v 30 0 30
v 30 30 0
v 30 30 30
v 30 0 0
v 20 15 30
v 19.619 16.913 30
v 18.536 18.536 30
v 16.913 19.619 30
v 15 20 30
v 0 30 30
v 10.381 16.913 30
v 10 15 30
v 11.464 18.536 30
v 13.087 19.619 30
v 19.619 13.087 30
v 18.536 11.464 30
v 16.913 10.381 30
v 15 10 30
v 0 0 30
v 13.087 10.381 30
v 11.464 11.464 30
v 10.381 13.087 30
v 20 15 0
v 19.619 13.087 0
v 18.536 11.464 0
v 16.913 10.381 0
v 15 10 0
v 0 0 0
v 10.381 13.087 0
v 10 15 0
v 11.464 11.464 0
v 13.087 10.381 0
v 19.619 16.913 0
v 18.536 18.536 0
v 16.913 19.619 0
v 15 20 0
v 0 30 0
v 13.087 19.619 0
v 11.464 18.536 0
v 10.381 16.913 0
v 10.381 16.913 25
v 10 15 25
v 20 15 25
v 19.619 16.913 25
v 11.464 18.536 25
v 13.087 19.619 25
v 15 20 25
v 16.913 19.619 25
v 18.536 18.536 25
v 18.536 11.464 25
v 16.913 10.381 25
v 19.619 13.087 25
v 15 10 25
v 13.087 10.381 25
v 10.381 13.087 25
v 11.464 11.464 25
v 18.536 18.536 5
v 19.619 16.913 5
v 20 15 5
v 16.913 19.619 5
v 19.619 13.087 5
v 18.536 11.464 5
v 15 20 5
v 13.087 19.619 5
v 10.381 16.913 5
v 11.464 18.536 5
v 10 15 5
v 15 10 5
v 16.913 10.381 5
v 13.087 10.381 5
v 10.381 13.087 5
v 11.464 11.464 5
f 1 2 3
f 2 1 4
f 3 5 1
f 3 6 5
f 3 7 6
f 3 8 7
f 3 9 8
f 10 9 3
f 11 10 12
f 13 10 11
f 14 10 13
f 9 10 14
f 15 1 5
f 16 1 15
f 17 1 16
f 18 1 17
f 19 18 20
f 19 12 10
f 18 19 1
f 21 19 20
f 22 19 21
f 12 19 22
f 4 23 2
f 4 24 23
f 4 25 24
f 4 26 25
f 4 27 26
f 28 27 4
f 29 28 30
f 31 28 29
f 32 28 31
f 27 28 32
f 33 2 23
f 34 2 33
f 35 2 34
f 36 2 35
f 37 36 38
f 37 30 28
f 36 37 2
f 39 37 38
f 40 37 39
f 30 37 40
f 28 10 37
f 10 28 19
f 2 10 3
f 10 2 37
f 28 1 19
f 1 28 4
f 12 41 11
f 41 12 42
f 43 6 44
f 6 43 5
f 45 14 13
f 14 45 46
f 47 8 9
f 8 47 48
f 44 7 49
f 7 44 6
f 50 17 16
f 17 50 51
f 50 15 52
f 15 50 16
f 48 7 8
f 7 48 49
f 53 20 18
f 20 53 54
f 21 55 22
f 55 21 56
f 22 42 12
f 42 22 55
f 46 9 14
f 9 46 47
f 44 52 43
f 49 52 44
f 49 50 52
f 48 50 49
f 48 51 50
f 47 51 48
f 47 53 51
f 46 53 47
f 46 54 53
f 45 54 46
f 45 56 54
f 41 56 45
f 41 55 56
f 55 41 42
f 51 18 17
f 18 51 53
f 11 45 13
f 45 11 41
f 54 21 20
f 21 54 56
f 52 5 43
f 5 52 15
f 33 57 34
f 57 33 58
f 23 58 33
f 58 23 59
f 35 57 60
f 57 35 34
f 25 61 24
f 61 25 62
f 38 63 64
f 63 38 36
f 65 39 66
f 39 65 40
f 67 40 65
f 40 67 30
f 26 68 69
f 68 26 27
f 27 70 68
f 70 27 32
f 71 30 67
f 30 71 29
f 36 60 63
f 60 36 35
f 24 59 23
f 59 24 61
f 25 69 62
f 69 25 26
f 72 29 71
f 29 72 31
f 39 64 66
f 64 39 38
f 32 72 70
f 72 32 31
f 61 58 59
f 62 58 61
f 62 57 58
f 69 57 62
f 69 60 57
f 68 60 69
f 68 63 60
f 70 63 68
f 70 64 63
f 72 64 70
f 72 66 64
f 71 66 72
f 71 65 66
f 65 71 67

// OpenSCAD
difference() {
    cube([30, 30, 30]);
    translate([15, 15, 25]) cylinder(h = 20, r = 5);
    translate([15, 15, -15]) cylinder(h = 20, r = 5);
    translate([15, -15, 5]) cylinder(h = 20, r = 5);
    translate([-15, 15, 5]) cylinder(h = 20, r = 5);
    translate([-15, -15, 5]) cylinder(h = 20, r = 5);
}
